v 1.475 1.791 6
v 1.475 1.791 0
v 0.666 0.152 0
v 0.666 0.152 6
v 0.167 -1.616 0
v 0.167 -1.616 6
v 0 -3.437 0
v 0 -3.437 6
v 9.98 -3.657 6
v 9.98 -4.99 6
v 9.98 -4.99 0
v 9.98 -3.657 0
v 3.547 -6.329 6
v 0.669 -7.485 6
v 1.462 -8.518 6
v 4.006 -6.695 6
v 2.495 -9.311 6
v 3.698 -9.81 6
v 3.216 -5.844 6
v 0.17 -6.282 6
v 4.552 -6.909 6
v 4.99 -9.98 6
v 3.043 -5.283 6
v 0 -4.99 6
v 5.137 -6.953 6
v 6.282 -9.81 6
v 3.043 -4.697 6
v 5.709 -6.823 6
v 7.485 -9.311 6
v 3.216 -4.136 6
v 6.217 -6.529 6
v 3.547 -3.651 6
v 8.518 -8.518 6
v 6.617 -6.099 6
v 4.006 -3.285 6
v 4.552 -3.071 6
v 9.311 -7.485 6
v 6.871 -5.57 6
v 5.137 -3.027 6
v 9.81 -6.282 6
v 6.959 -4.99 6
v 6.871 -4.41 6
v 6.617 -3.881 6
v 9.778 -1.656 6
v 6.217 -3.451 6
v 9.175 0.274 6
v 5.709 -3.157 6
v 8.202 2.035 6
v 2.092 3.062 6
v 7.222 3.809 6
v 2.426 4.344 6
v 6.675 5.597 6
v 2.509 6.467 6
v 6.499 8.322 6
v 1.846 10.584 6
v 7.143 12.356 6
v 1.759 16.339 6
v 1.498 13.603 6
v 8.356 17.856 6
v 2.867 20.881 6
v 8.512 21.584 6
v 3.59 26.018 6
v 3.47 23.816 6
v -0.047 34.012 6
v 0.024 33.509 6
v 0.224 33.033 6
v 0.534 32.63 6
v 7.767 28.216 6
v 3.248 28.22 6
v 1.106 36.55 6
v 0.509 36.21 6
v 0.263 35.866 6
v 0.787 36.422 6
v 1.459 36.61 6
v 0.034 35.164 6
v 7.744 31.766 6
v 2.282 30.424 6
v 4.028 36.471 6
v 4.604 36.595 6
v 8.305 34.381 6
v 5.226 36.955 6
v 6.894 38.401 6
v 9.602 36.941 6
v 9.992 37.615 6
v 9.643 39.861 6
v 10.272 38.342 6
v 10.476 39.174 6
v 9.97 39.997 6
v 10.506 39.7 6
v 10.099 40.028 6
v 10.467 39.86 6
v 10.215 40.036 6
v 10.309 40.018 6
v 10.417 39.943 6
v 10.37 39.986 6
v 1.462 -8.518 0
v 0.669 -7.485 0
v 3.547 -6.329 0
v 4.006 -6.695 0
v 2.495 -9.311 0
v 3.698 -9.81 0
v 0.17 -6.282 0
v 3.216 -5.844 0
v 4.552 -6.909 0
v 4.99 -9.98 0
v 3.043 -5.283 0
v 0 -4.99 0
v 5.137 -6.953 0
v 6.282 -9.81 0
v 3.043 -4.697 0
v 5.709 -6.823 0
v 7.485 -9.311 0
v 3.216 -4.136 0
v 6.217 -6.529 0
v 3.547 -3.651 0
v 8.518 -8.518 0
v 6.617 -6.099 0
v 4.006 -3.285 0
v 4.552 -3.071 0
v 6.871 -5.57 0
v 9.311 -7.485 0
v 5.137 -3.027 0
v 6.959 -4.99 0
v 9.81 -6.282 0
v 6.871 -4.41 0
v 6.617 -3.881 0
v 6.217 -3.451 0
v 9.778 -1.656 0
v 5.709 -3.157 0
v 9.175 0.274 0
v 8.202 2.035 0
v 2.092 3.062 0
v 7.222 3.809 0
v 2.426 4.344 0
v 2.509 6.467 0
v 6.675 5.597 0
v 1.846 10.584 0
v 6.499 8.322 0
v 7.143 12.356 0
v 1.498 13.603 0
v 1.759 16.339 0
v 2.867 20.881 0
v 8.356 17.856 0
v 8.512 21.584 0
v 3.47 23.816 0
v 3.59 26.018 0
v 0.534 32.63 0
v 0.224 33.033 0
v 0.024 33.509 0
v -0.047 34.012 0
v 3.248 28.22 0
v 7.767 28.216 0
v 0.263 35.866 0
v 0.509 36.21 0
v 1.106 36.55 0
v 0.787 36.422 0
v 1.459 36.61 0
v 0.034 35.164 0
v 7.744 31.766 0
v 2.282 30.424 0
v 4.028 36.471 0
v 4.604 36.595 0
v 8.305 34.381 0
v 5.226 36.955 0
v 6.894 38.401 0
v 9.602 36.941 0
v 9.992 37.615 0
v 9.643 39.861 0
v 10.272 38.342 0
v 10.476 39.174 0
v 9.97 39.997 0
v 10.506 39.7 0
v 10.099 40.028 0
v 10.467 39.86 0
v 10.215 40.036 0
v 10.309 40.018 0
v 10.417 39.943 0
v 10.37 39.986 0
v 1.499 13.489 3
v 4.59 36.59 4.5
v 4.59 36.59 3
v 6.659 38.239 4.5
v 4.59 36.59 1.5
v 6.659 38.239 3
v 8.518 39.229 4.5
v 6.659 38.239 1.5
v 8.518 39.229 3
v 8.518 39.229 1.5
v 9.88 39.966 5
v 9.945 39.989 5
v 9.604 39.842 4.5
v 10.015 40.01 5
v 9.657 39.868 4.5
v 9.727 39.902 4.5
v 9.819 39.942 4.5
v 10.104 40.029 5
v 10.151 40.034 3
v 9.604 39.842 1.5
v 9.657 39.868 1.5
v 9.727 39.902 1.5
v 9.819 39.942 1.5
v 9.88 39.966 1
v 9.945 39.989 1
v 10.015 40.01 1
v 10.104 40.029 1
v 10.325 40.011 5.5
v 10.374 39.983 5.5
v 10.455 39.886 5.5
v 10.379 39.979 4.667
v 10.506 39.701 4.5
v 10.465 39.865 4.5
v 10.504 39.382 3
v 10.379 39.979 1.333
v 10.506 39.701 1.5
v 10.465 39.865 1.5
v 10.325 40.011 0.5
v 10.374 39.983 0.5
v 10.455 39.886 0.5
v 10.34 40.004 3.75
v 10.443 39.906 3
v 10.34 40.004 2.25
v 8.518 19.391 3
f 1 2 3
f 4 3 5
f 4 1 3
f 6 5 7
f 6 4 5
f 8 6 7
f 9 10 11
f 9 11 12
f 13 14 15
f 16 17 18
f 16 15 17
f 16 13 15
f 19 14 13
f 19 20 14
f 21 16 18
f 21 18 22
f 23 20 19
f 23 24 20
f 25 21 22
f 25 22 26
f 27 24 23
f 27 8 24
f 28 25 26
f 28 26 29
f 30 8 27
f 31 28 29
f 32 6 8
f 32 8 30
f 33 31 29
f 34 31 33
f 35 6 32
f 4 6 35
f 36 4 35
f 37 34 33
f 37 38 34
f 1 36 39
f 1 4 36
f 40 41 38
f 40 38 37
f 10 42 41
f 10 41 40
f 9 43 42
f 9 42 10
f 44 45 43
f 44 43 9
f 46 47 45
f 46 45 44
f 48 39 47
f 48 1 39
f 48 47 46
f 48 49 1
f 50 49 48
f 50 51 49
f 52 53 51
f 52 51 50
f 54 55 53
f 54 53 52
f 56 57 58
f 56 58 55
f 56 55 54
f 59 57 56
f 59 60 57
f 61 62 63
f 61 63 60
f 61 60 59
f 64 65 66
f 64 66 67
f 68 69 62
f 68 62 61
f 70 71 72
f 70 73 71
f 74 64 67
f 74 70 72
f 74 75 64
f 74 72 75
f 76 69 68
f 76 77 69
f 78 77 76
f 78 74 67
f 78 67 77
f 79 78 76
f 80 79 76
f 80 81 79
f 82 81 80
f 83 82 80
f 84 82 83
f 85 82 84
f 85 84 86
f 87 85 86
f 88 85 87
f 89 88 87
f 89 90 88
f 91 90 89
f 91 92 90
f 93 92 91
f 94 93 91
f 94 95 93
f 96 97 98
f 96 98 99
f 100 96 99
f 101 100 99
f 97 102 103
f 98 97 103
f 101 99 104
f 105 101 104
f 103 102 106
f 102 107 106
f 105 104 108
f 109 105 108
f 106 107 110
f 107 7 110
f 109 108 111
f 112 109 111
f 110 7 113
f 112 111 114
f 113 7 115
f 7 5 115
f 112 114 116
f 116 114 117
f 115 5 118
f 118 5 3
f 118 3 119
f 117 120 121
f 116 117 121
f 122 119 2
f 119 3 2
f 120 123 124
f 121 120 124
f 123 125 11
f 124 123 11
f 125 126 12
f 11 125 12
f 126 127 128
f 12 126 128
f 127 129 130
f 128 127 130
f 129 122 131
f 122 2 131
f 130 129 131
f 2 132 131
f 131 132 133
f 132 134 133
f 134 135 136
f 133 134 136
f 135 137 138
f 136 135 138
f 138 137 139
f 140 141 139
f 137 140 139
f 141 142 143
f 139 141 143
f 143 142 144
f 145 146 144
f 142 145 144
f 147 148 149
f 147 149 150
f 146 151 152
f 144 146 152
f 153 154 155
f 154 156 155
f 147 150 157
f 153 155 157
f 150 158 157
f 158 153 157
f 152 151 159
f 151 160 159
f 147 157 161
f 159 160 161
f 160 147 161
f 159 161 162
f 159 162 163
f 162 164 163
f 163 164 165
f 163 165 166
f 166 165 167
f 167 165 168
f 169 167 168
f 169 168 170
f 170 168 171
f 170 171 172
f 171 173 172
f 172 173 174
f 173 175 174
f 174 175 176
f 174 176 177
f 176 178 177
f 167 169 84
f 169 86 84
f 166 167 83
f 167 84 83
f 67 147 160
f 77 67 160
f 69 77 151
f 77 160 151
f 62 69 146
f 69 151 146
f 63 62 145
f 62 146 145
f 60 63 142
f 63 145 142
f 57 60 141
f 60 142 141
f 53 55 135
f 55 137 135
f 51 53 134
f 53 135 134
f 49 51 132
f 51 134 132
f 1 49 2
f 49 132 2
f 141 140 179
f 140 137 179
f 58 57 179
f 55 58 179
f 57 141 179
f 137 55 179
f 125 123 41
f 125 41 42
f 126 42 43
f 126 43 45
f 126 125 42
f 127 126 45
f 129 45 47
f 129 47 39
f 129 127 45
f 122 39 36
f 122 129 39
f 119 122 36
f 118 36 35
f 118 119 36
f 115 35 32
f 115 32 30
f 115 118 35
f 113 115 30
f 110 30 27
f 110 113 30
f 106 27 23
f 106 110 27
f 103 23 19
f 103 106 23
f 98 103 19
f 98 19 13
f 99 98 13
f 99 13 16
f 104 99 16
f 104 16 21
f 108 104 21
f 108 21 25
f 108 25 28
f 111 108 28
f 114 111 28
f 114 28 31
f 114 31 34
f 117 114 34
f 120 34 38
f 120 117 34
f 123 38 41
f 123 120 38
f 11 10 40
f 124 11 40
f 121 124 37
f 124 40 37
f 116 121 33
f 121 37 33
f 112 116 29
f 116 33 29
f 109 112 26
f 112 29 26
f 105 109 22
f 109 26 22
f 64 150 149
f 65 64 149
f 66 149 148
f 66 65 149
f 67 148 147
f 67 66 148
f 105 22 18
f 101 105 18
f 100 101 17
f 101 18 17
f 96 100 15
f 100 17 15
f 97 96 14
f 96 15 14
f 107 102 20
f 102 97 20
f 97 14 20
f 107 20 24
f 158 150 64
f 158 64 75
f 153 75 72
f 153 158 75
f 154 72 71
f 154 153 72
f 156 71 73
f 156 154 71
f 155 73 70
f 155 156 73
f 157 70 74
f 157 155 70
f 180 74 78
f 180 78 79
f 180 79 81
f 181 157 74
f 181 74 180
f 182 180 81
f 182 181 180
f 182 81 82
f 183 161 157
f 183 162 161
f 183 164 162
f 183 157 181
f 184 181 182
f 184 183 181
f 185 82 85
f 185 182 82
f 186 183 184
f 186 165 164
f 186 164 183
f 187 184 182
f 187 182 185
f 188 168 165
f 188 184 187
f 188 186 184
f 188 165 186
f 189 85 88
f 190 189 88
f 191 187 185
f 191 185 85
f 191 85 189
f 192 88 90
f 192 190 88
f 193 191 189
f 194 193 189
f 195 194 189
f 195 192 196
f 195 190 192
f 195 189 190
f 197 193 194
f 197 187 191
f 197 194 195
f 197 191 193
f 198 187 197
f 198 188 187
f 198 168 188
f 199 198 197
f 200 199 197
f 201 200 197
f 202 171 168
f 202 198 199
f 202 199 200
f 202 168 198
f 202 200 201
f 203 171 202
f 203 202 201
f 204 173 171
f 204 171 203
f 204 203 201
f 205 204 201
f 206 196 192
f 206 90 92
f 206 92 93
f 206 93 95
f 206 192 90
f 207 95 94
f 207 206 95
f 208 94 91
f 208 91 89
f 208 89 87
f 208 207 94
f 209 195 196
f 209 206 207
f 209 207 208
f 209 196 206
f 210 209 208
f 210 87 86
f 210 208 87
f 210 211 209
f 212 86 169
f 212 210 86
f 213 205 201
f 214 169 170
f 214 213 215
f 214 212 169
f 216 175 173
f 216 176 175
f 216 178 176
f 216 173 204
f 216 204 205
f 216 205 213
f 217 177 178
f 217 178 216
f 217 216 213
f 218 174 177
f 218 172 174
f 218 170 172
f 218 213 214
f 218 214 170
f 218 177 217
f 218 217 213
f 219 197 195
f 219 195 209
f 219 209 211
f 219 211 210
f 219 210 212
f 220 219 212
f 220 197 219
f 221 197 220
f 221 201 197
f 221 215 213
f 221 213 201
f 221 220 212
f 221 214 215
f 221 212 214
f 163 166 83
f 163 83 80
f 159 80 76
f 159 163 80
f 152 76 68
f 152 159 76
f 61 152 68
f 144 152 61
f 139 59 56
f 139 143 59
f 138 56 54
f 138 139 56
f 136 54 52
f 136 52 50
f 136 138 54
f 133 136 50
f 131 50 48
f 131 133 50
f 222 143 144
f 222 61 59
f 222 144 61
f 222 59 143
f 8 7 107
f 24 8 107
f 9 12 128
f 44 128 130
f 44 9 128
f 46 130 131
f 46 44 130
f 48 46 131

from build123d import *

# Parameters (mm, degrees)
SKETCH1_R           = 1.968584464
BOSS_EXTRUDE2_DEPTH = 6
FILLET4_R           = 5
FILLET6_R           = 2
FILLET7_R           = 10
FILLET8_R           = 10
FILLET10_R          = 1
FILLET11_R          = 1
CUT_EXTRUDE1_DEPTH  = 10


with BuildPart() as part:
    # Sketch1 → Boss-Extrude2 (new body)
    with BuildSketch(Plane.XY):
        with BuildLine():
            Line((0, 0), (0, -9.98))
            Line((0, -9.98), (9.98, -9.98))
            Line((9.98, -9.98), (9.98, 0))
            add(Edge.make_bspline(
                [(9.98, 37.459838996), (5.582240321, 31.754849972), (12.492520243, 18.672418011), (3.340825824, 6.221702166), (9.98, 0)],
                knots=[0, 0, 0, 0, 0.478051335, 1, 1, 1, 1], degree=3))
            add(Edge.make_bspline(
                [(0, 33.141730679), (-0.475525657, 38.477983596), (3.957816191, 34.827903257), (6.4220881, 38.386082907), (9.108108181, 39.295033573), (11.329672234, 41.241349396), (9.98, 37.459838996)],
                knots=[0, 0, 0, 0, 0.419249338, 0.591045552, 0.727790706, 1, 1, 1, 1], degree=3))
            add(Edge.make_bspline(
                [(0, 33.141730679), (7.183564459, 26.576095652), (-2.679225241, 15.509345178), (4.562219574, 4.334652236), (0, 0)],
                knots=[0, 0, 0, 0, 0.589573003, 1, 1, 1, 1], degree=3))
        make_face()
        with Locations((4.99, -4.99)):
            Circle(SKETCH1_R, mode=Mode.SUBTRACT)
    extrude(amount=BOSS_EXTRUDE2_DEPTH)

    # Fillet4
    fillet4_edges = [part.edges().sort_by_distance(p)[0] for p in [
        (9.98, 37.459838996, 3),
    ]]
    fillet(fillet4_edges, radius=FILLET4_R)

    # Fillet6
    fillet6_edges = [part.edges().sort_by_distance(p)[0] for p in [
        (0, 33.141730679, 3),
    ]]
    fillet(fillet6_edges, radius=FILLET6_R)

    # Fillet7
    fillet7_edges = [part.edges().sort_by_distance(p)[0] for p in [
        (0, 0, 3),
    ]]
    fillet(fillet7_edges, radius=FILLET7_R)

    # Fillet8
    fillet8_edges = [part.edges().sort_by_distance(p)[0] for p in [
        (9.98, 0, 3),
    ]]
    fillet(fillet8_edges, radius=FILLET8_R)

    # Fillet10
    fillet10_edges = [part.edges().sort_by_distance(p)[0] for p in [
        (9.98, -9.98, 3),
    ]]
    fillet(fillet10_edges, radius=FILLET10_R)

    # Fillet11
    fillet11_edges = [part.edges().sort_by_distance(p)[0] for p in [
        (0, -9.98, 3),
    ]]
    fillet(fillet11_edges, radius=FILLET11_R)

    # Sketch2 → Cut-Extrude1 (cut)
    with BuildSketch(Plane.XY.offset(6)):
        with BuildLine():
            Line((9.98, -8.98), (9.98, -4.99))
            ThreePointArc((9.98, -4.99), (8.518462838, -8.518462838), (4.99, -9.98))
            Line((4.99, -9.98), (8.98, -9.98))
            ThreePointArc((8.98, -9.98), (9.687106781, -9.687106781), (9.98, -8.98))
        make_face()
        with BuildLine():
            ThreePointArc((4.99, -9.98), (1.461537162, -8.518462838), (0, -4.99))
            Line((0, -4.99), (0, -8.98))
            ThreePointArc((0, -8.98), (0.292893219, -9.687106781), (1, -9.98))
            Line((1, -9.98), (4.99, -9.98))
        make_face()
    extrude(amount=-CUT_EXTRUDE1_DEPTH, mode=Mode.SUBTRACT)


solid = part.part
